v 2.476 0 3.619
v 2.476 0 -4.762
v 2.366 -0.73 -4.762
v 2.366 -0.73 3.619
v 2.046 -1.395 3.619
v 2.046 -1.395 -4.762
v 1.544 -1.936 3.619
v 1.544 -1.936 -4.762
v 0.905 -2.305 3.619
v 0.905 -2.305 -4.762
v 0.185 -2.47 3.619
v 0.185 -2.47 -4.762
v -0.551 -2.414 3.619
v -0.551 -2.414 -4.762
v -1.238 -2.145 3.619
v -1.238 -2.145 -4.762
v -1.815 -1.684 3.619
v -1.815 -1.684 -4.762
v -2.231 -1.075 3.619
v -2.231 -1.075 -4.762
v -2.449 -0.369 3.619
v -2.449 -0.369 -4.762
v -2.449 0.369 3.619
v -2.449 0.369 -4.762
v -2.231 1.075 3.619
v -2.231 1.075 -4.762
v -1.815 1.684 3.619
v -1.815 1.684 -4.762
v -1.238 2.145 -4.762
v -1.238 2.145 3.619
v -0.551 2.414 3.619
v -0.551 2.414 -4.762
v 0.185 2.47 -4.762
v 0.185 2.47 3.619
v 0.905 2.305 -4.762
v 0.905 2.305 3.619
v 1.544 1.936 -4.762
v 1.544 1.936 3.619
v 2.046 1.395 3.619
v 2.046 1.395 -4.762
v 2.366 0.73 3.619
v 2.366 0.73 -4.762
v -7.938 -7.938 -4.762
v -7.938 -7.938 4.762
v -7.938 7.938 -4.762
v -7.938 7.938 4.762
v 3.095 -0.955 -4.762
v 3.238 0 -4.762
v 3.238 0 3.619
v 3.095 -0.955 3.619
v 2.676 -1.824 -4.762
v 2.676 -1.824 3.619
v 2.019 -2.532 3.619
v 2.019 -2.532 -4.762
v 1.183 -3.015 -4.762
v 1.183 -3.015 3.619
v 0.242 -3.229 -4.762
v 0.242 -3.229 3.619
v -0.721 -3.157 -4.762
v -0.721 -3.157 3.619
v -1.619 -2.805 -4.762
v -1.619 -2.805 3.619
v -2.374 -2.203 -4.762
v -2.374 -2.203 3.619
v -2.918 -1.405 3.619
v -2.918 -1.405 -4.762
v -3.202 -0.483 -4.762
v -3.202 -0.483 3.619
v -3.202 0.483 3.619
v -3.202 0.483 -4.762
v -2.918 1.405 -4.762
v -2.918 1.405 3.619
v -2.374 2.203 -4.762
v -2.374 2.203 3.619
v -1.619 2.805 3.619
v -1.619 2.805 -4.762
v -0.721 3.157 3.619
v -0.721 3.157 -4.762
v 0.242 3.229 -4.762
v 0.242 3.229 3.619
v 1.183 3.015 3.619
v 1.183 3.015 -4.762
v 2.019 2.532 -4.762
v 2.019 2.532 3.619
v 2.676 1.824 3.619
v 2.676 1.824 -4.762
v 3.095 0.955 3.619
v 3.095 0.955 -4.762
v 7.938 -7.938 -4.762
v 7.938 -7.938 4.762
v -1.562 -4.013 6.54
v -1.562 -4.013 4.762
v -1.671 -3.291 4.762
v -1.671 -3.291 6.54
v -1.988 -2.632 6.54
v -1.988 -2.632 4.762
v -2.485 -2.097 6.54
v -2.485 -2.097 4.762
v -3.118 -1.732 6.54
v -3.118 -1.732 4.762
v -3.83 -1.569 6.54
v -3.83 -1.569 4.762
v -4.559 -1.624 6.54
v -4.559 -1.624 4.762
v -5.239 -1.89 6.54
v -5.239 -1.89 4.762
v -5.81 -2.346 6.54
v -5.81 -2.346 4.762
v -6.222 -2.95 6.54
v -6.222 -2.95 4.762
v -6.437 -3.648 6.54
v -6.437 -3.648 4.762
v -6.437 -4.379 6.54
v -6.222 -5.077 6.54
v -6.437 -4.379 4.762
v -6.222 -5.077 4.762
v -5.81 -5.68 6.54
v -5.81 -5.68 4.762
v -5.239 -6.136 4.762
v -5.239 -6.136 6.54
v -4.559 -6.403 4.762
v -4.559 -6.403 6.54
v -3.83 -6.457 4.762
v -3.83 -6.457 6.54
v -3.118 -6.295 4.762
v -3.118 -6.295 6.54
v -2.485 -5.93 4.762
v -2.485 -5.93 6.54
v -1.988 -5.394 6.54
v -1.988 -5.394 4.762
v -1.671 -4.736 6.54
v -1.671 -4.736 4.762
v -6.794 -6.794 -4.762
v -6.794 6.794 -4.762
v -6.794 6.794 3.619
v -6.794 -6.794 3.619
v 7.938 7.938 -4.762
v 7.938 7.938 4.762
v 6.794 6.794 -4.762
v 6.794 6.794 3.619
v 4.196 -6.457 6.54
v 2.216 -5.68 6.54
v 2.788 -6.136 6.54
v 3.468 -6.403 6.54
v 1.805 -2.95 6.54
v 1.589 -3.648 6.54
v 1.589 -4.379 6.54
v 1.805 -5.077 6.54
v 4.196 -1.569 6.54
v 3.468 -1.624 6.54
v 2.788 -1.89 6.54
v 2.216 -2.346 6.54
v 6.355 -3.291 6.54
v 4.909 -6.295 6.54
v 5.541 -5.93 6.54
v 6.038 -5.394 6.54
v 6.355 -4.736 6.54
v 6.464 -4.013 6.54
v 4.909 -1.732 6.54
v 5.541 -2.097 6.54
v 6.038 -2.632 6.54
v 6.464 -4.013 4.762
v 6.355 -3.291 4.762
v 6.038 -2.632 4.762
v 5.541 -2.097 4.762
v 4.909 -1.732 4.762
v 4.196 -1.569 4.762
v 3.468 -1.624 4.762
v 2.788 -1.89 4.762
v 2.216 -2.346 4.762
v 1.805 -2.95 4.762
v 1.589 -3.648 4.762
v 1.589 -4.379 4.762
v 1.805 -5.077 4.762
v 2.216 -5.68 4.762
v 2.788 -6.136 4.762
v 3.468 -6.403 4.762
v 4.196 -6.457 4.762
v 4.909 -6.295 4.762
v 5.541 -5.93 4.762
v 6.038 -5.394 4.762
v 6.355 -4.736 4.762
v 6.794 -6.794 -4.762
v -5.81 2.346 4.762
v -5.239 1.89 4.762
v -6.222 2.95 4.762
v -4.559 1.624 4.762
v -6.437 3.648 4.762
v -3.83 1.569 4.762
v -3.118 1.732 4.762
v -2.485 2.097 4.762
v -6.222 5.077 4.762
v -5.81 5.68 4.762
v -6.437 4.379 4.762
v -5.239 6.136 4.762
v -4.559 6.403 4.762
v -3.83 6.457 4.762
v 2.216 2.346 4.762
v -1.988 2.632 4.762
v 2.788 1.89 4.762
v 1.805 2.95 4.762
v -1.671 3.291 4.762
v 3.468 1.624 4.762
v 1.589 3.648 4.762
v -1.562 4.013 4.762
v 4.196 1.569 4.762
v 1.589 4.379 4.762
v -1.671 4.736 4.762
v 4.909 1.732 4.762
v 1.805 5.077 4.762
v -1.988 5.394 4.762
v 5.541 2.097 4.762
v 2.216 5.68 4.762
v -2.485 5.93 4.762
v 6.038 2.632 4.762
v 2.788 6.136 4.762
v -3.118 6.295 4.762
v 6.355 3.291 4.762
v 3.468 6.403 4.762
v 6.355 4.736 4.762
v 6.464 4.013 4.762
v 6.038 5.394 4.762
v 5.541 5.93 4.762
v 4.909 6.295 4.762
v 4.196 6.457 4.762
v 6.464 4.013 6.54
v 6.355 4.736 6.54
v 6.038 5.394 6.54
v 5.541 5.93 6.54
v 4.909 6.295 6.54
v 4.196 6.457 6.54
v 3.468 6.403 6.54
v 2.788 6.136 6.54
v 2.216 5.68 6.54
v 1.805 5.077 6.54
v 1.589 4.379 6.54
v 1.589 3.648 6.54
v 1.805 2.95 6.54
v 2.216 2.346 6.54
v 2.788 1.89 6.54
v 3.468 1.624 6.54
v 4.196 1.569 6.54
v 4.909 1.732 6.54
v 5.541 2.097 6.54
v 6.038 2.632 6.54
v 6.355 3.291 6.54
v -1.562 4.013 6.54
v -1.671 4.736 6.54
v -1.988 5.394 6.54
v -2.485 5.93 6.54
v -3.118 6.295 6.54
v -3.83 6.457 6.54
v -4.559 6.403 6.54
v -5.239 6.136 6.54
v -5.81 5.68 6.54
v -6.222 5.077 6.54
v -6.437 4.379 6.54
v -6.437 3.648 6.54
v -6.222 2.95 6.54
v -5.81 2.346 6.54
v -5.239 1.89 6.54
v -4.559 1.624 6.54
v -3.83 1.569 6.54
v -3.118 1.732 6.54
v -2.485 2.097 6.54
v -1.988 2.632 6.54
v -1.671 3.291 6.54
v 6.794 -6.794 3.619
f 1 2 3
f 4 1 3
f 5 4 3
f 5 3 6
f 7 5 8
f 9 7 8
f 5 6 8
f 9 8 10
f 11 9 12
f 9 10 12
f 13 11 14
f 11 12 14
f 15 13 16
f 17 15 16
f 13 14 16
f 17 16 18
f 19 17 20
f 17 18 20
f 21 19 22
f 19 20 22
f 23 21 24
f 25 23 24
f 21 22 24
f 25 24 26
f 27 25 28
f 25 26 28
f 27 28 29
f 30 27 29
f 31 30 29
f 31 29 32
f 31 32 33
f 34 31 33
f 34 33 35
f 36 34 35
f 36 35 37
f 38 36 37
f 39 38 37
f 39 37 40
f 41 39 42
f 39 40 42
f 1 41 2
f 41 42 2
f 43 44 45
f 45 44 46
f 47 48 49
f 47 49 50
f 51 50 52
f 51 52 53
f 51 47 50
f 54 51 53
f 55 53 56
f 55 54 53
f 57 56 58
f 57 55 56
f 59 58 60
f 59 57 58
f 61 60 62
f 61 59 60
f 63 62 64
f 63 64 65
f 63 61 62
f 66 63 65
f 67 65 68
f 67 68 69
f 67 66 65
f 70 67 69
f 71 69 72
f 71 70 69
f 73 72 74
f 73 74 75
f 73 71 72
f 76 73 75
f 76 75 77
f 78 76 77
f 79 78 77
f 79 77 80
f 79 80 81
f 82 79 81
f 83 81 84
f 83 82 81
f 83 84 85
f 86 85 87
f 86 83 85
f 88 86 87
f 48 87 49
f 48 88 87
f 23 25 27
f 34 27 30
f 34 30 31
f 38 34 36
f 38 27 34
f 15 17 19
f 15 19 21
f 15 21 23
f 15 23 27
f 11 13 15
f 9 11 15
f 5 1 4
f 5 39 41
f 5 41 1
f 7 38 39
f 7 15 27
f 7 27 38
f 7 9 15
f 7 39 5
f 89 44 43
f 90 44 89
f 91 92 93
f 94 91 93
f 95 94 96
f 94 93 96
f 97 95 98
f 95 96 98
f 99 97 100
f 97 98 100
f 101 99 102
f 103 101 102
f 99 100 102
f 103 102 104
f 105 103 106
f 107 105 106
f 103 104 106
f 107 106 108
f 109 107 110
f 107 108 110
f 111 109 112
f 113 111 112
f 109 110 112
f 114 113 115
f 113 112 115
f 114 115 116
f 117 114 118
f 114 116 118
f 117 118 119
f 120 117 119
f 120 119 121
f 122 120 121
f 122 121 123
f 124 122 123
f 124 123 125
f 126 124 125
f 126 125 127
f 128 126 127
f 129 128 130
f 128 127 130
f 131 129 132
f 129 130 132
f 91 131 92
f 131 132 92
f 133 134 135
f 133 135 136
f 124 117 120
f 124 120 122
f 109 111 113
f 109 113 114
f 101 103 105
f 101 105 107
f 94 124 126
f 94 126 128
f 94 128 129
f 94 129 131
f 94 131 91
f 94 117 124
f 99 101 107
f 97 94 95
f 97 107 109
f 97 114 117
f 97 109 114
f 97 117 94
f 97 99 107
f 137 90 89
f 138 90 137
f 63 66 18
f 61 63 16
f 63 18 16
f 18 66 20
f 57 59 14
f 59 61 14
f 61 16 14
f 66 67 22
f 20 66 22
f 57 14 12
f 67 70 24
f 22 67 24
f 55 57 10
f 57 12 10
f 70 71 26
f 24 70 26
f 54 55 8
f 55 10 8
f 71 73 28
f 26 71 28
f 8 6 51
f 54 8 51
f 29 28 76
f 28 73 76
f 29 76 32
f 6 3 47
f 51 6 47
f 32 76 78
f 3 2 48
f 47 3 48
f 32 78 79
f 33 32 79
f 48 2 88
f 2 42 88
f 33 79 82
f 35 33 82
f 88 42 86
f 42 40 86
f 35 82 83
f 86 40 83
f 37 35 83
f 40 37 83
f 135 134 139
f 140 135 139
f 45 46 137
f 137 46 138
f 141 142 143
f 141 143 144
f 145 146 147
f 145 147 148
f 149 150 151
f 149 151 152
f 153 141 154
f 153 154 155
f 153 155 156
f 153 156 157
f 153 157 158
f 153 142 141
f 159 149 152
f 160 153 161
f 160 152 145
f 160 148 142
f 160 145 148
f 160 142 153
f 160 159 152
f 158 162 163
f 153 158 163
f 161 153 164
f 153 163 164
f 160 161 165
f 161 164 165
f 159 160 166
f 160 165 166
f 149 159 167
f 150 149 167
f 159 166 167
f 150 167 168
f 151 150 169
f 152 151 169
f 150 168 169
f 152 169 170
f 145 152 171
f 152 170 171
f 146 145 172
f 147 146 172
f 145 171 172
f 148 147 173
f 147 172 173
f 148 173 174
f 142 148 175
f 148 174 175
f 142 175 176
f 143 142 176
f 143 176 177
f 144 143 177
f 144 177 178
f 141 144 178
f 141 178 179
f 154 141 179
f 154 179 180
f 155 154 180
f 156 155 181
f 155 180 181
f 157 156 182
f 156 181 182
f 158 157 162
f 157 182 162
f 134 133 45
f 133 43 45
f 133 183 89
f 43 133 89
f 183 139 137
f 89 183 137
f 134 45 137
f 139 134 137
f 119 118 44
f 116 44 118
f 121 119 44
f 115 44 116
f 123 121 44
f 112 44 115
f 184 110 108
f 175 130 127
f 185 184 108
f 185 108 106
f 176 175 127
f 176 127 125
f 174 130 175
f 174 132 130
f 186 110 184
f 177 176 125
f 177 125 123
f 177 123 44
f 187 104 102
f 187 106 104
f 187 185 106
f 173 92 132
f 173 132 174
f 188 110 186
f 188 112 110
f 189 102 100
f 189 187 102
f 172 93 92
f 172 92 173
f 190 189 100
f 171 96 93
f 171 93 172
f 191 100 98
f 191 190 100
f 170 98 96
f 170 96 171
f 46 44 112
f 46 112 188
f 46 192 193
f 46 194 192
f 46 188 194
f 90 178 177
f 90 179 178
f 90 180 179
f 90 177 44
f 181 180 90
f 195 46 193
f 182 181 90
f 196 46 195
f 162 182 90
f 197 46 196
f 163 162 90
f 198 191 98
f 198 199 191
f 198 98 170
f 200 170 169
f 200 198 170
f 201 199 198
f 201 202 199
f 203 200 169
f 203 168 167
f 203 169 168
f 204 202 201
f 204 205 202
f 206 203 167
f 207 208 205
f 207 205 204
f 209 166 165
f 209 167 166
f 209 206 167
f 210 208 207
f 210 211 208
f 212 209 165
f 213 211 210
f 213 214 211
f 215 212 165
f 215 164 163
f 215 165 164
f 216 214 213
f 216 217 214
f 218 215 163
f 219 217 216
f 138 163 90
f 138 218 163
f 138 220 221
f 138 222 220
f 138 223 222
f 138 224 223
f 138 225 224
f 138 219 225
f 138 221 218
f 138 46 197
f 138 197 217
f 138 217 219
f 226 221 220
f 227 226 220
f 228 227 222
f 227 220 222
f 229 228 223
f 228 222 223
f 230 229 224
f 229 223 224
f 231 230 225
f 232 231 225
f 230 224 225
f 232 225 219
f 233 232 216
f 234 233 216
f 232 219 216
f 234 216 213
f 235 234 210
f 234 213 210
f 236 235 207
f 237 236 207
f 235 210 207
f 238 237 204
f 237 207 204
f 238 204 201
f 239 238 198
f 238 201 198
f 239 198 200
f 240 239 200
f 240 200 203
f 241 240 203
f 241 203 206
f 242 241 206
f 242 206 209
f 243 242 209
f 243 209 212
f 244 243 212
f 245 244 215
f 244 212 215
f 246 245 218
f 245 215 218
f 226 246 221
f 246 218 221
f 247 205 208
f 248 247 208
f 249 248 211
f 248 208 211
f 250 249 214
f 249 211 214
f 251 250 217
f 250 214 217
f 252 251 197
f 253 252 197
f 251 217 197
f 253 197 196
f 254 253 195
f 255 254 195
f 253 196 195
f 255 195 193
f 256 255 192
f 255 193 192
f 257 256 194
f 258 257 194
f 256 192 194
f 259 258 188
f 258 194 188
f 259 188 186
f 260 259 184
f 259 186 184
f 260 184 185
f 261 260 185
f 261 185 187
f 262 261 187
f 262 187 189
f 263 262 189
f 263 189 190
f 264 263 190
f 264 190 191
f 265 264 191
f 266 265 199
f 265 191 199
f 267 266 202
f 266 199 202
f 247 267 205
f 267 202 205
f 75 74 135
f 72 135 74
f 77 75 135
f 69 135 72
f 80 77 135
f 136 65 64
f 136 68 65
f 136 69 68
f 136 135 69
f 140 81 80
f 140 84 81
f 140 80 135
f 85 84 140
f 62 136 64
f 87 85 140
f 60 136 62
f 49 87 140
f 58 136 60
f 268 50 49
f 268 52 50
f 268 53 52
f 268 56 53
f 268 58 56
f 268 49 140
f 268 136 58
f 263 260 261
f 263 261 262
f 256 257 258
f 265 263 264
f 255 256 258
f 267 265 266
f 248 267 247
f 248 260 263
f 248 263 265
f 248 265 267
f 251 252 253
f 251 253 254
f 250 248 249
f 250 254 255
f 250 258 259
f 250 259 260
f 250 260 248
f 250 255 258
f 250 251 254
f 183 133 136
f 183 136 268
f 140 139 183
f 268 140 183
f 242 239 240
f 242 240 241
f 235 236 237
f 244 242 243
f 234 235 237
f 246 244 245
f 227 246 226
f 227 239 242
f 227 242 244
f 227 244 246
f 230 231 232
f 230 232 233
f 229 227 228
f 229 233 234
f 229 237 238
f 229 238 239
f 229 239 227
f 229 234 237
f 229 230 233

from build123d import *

# Parameters (mm, degrees)
F0_W     = 15.875
F0_H     = 15.875
F1_DEPTH = 4.7625
F2_R     = 2.4511
F3_DEPTH = 1.778
F4_W     = 13.589
F4_H     = 13.589
F4_R     = 3.2385
F5_DEPTH = 8.382
F6_R     = 2.4765
F7_DEPTH = 8.382


with BuildPart() as f1:
    # F0 (on Top) → F1 (new body, symmetric)
    with BuildSketch(Plane.XY):
        Rectangle(F0_W, F0_H)
    extrude(amount=F1_DEPTH, both=True)

    # F2 (on face) → F3 (join)
    with BuildSketch(Plane.XY.offset(4.7625)):
        with Locations((-4.0132, -4.0132)):
            Circle(F2_R)
        with Locations((4.0132, -4.0132)):
            Circle(F2_R)
        with Locations((4.0132, 4.0132)):
            Circle(F2_R)
        with Locations((-4.0132, 4.0132)):
            Circle(F2_R)
    extrude(amount=F3_DEPTH)

    # F4 (on face) → F5 (cut)
    with BuildSketch(Plane(origin=(0, 0, -4.7625), x_dir=(1, 0, 0), z_dir=(0, 0, -1))):
        Rectangle(F4_W, F4_H)
        Circle(F4_R, mode=Mode.SUBTRACT)
    extrude(amount=-F5_DEPTH, mode=Mode.SUBTRACT)

    # F6 (on face) → F7 (cut)
    with BuildSketch(Plane(origin=(0, 0, -4.7625), x_dir=(1, 0, 0), z_dir=(0, 0, -1))):
        Circle(F6_R)
    extrude(amount=-F7_DEPTH, mode=Mode.SUBTRACT)


solid = f1.part
